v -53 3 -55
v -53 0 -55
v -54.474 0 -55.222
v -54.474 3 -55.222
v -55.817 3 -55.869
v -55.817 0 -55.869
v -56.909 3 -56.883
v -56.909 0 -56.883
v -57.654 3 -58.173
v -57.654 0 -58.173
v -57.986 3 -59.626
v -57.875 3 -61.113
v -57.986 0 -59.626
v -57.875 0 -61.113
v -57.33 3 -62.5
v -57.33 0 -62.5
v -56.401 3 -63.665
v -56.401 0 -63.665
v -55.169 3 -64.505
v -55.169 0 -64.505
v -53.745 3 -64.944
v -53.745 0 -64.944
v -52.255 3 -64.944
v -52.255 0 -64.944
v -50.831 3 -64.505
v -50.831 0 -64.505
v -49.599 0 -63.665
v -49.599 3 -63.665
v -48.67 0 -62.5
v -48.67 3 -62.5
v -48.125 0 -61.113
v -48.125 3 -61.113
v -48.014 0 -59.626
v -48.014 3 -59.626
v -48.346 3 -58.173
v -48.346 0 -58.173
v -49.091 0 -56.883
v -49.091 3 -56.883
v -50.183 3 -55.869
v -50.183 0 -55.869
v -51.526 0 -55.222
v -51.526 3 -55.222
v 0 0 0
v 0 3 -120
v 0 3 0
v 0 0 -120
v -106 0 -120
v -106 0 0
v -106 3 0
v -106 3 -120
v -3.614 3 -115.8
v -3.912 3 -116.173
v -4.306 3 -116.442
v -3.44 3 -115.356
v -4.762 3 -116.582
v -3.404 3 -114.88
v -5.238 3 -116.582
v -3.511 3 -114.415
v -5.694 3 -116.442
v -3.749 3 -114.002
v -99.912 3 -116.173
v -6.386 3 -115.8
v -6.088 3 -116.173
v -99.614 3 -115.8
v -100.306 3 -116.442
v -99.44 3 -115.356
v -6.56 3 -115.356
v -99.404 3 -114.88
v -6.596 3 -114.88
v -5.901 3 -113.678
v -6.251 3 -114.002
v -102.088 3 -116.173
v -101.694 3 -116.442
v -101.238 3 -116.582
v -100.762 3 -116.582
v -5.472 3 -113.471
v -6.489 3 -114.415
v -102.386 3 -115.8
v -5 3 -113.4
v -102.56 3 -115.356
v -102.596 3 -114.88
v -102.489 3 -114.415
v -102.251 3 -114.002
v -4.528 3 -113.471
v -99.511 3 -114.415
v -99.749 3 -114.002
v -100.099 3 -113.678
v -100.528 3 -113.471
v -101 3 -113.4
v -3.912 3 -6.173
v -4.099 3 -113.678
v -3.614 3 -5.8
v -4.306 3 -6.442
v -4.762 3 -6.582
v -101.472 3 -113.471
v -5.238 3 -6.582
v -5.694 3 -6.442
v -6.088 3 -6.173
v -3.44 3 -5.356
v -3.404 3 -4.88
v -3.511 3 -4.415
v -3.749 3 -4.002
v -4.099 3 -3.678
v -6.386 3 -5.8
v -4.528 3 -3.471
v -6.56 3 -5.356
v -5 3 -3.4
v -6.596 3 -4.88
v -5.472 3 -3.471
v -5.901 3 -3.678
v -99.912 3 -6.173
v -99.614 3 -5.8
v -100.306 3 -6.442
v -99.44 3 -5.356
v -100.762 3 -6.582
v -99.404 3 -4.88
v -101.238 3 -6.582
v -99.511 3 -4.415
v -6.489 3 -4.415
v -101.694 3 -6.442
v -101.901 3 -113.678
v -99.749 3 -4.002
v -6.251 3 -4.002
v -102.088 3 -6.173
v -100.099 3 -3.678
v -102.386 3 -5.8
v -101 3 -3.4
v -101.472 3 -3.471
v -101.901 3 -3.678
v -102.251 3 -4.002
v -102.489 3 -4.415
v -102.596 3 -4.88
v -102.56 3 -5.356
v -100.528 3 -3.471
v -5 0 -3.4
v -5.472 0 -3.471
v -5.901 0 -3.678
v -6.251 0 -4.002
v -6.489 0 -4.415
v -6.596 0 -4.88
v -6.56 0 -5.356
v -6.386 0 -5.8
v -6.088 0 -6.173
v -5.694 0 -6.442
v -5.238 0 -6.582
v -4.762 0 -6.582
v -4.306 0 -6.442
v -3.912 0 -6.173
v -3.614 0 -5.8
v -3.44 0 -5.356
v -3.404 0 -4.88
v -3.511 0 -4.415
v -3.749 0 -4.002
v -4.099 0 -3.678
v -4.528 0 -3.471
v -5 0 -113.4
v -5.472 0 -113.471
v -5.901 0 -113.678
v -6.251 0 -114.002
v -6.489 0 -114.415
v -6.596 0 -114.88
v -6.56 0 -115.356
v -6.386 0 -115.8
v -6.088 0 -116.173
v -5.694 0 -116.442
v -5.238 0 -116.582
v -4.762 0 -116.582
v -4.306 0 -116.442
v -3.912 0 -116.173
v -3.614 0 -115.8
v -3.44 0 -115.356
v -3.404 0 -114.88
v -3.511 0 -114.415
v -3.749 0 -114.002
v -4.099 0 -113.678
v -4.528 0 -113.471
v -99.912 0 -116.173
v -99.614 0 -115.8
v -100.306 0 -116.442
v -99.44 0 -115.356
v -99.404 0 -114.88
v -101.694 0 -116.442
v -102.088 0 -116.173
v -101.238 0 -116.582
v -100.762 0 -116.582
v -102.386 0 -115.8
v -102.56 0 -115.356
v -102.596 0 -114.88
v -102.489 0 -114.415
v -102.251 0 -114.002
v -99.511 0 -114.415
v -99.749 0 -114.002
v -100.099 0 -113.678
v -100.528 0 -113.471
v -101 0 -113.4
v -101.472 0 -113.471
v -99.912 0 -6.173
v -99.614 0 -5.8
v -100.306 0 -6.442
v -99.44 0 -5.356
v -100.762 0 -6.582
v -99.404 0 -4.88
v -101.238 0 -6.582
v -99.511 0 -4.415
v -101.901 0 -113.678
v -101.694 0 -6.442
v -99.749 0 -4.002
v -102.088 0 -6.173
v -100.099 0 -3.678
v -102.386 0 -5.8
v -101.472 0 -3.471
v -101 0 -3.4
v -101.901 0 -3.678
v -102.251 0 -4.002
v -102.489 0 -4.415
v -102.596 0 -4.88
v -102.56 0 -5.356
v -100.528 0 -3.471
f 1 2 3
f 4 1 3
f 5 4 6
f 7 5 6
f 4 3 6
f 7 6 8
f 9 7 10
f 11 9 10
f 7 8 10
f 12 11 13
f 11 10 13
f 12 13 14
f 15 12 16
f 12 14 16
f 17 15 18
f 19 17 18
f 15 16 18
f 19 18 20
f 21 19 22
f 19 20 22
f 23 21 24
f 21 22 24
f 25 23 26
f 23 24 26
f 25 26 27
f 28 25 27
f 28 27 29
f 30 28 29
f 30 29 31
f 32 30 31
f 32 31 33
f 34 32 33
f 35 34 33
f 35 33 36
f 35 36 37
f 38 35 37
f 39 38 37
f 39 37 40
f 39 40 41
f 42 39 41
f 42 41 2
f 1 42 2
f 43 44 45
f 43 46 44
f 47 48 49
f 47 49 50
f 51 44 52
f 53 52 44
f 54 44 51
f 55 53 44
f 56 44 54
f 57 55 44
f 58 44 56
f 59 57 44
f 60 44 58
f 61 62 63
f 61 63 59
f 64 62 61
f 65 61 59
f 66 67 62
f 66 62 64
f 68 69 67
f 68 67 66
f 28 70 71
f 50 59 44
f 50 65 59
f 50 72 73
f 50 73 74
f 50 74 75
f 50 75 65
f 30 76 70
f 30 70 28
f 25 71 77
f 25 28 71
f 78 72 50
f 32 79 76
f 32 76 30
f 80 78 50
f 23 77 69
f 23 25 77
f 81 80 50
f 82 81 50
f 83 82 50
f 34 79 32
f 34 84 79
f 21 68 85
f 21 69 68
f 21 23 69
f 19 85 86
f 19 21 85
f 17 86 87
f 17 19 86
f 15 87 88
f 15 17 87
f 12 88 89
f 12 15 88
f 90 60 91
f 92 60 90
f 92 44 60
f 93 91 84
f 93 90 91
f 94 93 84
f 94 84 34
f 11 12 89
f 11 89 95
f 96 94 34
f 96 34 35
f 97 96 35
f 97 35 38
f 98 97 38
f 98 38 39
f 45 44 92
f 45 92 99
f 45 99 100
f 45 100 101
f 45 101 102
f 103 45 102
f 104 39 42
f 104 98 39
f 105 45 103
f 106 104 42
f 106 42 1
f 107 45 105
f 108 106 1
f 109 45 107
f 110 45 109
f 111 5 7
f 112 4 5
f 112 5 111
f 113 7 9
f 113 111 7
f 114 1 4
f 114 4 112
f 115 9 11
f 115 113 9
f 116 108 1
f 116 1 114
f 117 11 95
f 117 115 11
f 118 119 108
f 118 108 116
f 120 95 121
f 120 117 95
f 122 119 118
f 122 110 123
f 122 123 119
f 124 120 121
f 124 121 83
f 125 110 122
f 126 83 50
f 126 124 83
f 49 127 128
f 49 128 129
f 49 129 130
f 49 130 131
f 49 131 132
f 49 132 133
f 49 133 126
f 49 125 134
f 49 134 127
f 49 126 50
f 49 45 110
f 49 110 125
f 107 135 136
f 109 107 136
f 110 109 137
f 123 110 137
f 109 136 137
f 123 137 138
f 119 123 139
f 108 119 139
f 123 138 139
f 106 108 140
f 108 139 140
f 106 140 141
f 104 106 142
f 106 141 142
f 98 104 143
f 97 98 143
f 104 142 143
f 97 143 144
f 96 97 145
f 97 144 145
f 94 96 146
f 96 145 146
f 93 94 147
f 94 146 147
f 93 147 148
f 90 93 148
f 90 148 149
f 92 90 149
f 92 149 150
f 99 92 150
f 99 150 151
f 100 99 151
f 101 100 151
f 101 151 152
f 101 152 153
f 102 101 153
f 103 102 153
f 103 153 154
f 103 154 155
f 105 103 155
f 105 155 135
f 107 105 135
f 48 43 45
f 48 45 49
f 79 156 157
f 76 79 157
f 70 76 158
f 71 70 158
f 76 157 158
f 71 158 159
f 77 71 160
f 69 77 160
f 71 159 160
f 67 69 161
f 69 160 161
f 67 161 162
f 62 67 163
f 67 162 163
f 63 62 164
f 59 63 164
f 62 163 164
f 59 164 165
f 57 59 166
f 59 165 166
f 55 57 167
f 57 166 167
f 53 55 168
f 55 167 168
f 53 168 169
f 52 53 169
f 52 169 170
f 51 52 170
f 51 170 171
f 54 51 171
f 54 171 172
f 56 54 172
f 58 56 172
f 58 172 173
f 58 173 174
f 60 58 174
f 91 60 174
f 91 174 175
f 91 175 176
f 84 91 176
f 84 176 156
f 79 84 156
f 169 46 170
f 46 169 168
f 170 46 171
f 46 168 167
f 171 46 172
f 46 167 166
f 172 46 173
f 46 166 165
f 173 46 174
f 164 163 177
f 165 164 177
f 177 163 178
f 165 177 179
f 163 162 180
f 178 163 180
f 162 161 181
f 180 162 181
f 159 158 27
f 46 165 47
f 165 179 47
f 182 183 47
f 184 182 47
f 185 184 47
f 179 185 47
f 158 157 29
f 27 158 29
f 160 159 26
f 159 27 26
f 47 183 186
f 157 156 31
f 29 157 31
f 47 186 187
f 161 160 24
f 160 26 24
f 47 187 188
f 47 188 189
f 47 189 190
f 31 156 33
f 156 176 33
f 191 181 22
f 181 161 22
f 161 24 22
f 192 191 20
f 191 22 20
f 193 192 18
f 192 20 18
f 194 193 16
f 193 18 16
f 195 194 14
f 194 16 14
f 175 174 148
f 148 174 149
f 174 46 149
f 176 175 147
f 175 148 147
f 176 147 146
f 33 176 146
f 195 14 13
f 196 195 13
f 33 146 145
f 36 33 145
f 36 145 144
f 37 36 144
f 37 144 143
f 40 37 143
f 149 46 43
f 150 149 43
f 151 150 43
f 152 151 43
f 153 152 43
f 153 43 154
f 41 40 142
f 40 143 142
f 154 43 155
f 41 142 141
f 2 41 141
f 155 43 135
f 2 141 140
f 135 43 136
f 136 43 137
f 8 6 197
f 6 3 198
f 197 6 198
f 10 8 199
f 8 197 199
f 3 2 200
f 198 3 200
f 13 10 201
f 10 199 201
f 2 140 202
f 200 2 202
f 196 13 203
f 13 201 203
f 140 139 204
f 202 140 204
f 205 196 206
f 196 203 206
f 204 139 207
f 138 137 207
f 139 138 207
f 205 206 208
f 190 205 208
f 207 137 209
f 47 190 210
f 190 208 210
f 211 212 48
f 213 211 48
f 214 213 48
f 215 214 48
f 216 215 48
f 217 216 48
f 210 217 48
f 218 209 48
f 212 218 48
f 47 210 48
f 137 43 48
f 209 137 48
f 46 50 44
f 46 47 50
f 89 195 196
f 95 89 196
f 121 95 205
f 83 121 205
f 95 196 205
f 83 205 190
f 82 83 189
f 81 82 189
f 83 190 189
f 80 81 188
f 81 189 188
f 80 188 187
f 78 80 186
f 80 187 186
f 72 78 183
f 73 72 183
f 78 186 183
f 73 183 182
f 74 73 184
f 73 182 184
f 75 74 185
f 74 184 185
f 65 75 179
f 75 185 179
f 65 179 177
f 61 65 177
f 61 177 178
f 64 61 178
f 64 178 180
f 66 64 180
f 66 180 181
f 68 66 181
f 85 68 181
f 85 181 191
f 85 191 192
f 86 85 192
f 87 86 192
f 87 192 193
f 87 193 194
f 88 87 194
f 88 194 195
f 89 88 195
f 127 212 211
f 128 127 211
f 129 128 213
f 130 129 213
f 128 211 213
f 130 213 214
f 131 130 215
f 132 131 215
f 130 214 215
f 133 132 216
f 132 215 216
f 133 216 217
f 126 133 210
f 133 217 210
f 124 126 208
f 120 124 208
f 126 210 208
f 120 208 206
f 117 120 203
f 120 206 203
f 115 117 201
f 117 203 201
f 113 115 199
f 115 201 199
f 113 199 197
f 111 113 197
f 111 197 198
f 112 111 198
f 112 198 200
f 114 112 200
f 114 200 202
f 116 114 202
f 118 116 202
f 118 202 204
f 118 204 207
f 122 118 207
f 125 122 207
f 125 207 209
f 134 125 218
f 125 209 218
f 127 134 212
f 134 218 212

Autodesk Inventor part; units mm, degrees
ref_plane "YZ Plane" through (0, 0, 0) normal (1, 0, 0) x (0, 1, 0)
ref_plane "XZ Plane" through (0, 0, 0) normal (0, 1, 0) x (-1, 0, 0)
ref_plane "XY Plane" through (0, 0, 0) normal (0, 0, 1) x (1, 0, 0)
sketch "スケッチ1" plane through (0, 0, 0) normal (0, 1, 0) x (-1, 0, 0)
  line L0 (0, 0) -> (106, 0)
  line L1 (106, 0) -> (106, -120)
  line L2 (106, -120) -> (0, -120)
  line L3 (0, -120) -> (0, 0)
  dimension "d0" = 106
  dimension "d1" = 120
extrude "押し出し1" add sketch "スケッチ1" along normal blind 3
sketch "スケッチ4" plane through (0, 3, 0) normal (0, 1, 0) x (1, 0, 0)
  line L0 (-106, 120) -> (-106, 0) projected
  line L1 (-106, 5) -> (0, 5)
  line L2 (0, 0) -> (0, 120) projected
  line L3 (-120, 115) -> (0, 115)
  line L4 (-106, 0) -> (0, 0) projected
  line L5 (0, 120) -> (-106, 120) projected
  line L6 (-106, 0) -> (0, 0) projected
  line L7 (-101, 0) -> (-101, 120)
  line L8 (-5, 120) -> (-5, 0)
  point P0 (-101, 5)
  point P1 (-5, 5)
  point P2 (-5, 115)
  point P3 (-101, 115)
  dimension "d22" = 5
  dimension "d23" = 5
  dimension "d24" = 5
  dimension "d25" = 5
hole "穴2" at (-101, 3, -5) at (-5, 3, -5) at (-5, 3, -115) at (-101, 3, -115) direction (0, -1, 0) diameter 3.2 end through all
sketch "スケッチ5" plane through (0, 3, 0) normal (0, 1, 0) x (1, 0, 0)
  line L0 (-106, 120) -> (-106, 0) projected
  line L1 (-106, 60) -> (0, 60)
  line L2 (0, 0) -> (0, 120) projected
  point P0 (-53, 60)
hole "穴3" at (-53, 3, -60) direction (0, -1, 0) diameter 10 end through all
equation "\"d38\" = Thickness"
equation "\"BendRadius\" = Thickness"
equation "\"BendReliefWidth\" = Thickness"
equation "\"BendReliefDepth\" = 0.5 * Thickness"
equation "\"CornerReliefSize\" = 4 * Thickness"
equation "\"MinimumRemnant\" = 2 * Thickness"
equation "\"TransitionRadius\" = BendRadius"
equation "\"JacobiRadiusSize\" = BendRadius"
equation "\"GapSize\" = Thickness"
equation "\"Thickness\" = 0.5"
properties part number "link2_plate3" material "アルミニウム 6061"
